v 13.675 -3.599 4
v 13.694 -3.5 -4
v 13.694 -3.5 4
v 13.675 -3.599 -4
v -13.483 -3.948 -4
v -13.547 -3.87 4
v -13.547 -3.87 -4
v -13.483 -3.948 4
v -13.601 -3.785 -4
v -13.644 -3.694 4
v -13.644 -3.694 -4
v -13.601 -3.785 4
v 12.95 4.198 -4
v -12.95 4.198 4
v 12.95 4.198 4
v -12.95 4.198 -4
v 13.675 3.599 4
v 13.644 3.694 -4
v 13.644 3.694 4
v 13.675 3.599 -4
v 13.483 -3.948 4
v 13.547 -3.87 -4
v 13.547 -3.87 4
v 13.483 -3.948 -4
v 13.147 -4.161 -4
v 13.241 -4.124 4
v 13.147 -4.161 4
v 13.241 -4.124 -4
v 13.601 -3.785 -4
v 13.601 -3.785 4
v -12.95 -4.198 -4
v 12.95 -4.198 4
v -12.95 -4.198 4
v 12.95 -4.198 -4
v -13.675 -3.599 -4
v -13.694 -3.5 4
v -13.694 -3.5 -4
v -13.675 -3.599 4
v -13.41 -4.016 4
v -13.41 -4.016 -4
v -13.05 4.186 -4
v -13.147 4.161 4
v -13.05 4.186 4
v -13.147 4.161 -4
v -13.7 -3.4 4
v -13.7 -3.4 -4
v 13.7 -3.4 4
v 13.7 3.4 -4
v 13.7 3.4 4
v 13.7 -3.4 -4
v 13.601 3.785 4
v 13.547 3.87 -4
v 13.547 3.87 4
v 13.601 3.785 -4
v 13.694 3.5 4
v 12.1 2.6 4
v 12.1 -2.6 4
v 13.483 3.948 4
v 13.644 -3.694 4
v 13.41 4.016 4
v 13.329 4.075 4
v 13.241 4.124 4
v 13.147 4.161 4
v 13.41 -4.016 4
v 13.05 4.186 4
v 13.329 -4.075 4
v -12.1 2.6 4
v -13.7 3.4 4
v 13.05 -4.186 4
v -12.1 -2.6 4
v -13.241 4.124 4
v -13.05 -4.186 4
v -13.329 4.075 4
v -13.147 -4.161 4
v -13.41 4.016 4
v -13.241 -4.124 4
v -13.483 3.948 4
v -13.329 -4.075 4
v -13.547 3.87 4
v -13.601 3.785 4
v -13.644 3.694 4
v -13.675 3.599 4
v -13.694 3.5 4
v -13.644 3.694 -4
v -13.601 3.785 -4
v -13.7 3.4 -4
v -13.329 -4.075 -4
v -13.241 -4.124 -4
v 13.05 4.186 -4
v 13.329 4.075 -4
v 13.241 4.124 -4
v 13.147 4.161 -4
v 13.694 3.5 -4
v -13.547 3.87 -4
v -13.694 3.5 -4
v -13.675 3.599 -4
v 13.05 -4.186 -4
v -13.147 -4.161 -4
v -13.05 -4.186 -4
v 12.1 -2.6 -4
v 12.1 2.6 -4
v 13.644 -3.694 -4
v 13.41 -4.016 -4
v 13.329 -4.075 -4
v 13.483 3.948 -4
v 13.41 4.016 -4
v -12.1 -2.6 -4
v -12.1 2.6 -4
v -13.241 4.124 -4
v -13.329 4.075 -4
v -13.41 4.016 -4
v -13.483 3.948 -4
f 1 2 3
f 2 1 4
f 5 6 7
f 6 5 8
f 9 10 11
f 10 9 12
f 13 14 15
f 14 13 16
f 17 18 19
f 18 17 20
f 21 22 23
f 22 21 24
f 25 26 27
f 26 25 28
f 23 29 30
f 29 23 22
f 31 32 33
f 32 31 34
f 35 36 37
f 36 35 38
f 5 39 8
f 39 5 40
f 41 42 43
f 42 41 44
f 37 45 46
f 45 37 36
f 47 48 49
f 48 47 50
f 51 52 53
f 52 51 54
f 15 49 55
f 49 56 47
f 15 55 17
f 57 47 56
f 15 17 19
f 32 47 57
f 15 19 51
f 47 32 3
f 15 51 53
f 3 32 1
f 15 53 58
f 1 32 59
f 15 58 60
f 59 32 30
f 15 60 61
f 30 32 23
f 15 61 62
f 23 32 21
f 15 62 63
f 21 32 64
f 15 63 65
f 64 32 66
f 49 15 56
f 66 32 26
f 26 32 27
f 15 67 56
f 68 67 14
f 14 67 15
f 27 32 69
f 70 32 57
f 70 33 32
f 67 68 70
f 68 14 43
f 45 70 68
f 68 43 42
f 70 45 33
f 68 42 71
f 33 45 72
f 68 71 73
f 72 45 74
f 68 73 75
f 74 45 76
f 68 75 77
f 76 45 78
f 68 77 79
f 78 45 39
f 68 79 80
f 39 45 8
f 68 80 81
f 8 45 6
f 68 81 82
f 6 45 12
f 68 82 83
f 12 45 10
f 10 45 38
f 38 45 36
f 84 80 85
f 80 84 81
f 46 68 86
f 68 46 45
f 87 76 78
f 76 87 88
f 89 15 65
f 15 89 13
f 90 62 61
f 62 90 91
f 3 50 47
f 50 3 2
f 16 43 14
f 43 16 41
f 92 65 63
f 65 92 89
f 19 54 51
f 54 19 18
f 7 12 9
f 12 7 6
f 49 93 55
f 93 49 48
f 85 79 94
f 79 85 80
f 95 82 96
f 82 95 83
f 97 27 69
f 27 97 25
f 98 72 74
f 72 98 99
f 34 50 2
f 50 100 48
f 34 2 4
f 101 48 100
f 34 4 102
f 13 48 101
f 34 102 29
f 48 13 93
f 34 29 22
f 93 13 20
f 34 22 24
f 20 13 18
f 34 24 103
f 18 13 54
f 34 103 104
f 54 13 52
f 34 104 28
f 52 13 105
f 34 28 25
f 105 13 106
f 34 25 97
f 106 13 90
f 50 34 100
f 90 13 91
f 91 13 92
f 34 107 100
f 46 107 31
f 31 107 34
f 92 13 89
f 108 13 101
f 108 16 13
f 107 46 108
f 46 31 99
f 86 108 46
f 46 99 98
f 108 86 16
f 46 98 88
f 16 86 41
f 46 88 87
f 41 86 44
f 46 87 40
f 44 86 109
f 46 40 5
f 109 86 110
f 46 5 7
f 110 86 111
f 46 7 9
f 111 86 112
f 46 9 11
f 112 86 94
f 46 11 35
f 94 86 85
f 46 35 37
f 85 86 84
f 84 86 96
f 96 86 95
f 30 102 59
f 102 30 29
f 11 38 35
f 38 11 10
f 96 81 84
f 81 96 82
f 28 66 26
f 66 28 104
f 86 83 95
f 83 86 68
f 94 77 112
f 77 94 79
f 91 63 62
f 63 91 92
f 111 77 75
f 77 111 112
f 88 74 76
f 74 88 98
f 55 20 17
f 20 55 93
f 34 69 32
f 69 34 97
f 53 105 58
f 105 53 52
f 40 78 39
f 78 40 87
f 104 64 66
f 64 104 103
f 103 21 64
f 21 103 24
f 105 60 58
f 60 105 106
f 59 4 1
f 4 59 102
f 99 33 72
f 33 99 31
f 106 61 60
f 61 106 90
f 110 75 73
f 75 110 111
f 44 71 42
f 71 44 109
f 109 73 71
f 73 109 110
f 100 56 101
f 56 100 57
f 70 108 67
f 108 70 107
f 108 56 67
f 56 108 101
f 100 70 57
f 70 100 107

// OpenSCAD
//Dr_C Watch Band Retainer



//Watch Band Width
Watchband_width=24;

//Watch Band Thickness (Should be both arms measured thickness)
Watchband_Thickness=5;

//Desired Length of retainer
Retainer_Length=8;

//Retainer Thickness (Recommend multiple of Nozzle Thickness)
Retainer_Thickness = 1.6;

//Tolerance (Measured gap on all sides)
Retainer_Tolerance = 0.1;

//Rounded Edges
Rounded = true;
$fn=50;

if (Rounded==true)
    {
    difference () {
        minkowski (){cube ([Watchband_width+Retainer_Thickness+ (2*Retainer_Tolerance), Watchband_Thickness+Retainer_Thickness+ (2*Retainer_Tolerance), Retainer_Length-1],center = true);
        cylinder (r=Retainer_Thickness/2,h=1, center = true);
        }
        cube ([Watchband_width+ (2*Retainer_Tolerance), Watchband_Thickness + (2*Retainer_Tolerance), Retainer_Length*2],center = true);
}
}
else
{
    difference () {
        cube ([Watchband_width+(2*Retainer_Thickness)+ (2*Retainer_Tolerance), Watchband_Thickness+(2*Retainer_Thickness)+ (2*Retainer_Tolerance), Retainer_Length],center = true);
        cube ([Watchband_width+ (2*Retainer_Tolerance), Watchband_Thickness+ (2*Retainer_Tolerance), Retainer_Length],center = true);
    }
}
    
